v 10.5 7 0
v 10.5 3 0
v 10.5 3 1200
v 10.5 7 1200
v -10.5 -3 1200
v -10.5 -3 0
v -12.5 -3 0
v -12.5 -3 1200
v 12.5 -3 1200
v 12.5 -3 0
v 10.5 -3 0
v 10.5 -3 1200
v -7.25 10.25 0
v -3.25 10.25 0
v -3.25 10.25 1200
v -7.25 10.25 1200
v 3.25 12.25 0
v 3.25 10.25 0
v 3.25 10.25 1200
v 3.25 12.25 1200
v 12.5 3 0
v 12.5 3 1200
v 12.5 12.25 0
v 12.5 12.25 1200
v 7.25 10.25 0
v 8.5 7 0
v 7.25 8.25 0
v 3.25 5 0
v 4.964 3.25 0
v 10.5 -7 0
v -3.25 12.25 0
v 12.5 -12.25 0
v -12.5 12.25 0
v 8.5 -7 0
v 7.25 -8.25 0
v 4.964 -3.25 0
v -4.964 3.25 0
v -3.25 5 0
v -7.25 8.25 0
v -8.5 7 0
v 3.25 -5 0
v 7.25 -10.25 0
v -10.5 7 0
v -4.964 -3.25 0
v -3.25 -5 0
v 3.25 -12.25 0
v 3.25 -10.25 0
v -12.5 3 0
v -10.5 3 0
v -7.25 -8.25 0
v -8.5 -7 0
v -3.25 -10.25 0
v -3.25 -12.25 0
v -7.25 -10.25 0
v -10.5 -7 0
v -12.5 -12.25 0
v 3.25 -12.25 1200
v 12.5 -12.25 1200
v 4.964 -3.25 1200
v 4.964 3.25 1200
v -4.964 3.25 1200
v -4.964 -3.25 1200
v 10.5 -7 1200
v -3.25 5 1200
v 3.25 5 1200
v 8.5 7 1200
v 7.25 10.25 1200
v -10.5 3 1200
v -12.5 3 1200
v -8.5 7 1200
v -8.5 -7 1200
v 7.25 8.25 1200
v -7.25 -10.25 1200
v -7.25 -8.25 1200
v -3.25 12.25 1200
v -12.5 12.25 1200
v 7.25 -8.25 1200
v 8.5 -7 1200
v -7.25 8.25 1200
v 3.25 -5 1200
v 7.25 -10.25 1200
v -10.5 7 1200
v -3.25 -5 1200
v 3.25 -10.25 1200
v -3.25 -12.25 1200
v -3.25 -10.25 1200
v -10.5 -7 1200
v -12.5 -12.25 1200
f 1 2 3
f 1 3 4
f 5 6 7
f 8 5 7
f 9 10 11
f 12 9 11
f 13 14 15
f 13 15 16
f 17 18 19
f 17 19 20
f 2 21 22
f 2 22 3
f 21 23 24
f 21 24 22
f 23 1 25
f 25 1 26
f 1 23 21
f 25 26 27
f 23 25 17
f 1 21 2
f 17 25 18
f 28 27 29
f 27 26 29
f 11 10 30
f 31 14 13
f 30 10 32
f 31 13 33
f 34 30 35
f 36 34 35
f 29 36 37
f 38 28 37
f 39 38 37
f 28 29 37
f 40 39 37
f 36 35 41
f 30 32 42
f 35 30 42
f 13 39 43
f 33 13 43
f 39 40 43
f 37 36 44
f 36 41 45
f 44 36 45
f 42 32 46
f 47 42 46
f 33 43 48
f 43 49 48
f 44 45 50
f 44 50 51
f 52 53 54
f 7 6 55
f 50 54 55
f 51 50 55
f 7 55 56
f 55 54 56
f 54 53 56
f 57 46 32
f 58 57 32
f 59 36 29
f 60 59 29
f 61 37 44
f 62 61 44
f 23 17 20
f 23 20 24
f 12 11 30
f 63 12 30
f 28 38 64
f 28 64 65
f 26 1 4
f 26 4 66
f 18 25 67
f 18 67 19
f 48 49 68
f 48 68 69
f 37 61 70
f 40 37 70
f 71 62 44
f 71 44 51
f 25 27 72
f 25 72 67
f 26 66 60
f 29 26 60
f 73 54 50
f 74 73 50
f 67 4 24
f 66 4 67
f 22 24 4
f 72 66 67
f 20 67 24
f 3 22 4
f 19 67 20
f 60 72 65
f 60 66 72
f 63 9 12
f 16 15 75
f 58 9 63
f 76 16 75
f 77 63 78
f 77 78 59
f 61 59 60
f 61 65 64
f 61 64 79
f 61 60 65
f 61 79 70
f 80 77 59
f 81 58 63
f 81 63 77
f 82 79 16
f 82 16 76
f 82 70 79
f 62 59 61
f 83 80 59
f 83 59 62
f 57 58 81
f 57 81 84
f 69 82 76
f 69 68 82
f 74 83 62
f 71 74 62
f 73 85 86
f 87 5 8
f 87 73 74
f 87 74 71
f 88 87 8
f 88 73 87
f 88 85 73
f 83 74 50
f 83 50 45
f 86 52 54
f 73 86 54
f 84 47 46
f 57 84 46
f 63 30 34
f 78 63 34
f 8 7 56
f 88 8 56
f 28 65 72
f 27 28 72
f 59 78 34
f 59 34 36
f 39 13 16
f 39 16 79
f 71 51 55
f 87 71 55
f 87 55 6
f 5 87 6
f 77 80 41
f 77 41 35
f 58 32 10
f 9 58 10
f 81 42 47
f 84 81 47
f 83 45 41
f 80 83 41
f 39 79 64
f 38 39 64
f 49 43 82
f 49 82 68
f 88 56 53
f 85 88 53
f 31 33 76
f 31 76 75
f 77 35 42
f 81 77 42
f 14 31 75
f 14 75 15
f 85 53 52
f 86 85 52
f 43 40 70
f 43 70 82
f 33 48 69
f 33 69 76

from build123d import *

# Parameters (mm, degrees)
PAD_DEPTH    = 1200
SKETCH001_R  = 2
POCKET_DEPTH = 5.251


with BuildPart() as change_me_for_height:
    # Sketch → Pad (new body)
    with BuildSketch(Plane.XY):
        Polygon((-12.5, 3), (-12.5, 12.25), (-3.25, 12.25), (-3.25, 10.25), (-7.25, 10.25), (-7.25, 8.25), (-3.25, 5), (3.25, 5), (7.25, 8.25), (7.25, 10.25), (3.25, 10.25), (3.25, 12.25), (12.5, 12.25), (12.5, 3), (10.5, 3), (10.5, 7), (8.5, 7), (4.964466, 3.25), (4.964466, 0), (-4.964466, 0), (-4.964466, 3.25), (-8.5, 7), (-10.5, 7), (-10.5, 3), align=None)
    pad = extrude(amount=PAD_DEPTH)


with BuildPart() as mirrored:
    # Mirrored base: copy of Change_me_for_height
    add(change_me_for_height.part)

    # Mirrored: Pad across Sketch H_Axis
    add(pad.mirror(Plane.ZX))


with BuildPart() as pocket:
    # Fusion base: copy of Change_me_for_height
    add(change_me_for_height.part)

    # Fusion: union Mirrored
    add(mirrored.part)

    # Sketch001 → Pocket (cut, through all)
    with BuildSketch(Plane.XZ.offset(-7)):
        Circle(SKETCH001_R)
    extrude(amount=-POCKET_DEPTH, mode=Mode.SUBTRACT)


solid = pocket.part
